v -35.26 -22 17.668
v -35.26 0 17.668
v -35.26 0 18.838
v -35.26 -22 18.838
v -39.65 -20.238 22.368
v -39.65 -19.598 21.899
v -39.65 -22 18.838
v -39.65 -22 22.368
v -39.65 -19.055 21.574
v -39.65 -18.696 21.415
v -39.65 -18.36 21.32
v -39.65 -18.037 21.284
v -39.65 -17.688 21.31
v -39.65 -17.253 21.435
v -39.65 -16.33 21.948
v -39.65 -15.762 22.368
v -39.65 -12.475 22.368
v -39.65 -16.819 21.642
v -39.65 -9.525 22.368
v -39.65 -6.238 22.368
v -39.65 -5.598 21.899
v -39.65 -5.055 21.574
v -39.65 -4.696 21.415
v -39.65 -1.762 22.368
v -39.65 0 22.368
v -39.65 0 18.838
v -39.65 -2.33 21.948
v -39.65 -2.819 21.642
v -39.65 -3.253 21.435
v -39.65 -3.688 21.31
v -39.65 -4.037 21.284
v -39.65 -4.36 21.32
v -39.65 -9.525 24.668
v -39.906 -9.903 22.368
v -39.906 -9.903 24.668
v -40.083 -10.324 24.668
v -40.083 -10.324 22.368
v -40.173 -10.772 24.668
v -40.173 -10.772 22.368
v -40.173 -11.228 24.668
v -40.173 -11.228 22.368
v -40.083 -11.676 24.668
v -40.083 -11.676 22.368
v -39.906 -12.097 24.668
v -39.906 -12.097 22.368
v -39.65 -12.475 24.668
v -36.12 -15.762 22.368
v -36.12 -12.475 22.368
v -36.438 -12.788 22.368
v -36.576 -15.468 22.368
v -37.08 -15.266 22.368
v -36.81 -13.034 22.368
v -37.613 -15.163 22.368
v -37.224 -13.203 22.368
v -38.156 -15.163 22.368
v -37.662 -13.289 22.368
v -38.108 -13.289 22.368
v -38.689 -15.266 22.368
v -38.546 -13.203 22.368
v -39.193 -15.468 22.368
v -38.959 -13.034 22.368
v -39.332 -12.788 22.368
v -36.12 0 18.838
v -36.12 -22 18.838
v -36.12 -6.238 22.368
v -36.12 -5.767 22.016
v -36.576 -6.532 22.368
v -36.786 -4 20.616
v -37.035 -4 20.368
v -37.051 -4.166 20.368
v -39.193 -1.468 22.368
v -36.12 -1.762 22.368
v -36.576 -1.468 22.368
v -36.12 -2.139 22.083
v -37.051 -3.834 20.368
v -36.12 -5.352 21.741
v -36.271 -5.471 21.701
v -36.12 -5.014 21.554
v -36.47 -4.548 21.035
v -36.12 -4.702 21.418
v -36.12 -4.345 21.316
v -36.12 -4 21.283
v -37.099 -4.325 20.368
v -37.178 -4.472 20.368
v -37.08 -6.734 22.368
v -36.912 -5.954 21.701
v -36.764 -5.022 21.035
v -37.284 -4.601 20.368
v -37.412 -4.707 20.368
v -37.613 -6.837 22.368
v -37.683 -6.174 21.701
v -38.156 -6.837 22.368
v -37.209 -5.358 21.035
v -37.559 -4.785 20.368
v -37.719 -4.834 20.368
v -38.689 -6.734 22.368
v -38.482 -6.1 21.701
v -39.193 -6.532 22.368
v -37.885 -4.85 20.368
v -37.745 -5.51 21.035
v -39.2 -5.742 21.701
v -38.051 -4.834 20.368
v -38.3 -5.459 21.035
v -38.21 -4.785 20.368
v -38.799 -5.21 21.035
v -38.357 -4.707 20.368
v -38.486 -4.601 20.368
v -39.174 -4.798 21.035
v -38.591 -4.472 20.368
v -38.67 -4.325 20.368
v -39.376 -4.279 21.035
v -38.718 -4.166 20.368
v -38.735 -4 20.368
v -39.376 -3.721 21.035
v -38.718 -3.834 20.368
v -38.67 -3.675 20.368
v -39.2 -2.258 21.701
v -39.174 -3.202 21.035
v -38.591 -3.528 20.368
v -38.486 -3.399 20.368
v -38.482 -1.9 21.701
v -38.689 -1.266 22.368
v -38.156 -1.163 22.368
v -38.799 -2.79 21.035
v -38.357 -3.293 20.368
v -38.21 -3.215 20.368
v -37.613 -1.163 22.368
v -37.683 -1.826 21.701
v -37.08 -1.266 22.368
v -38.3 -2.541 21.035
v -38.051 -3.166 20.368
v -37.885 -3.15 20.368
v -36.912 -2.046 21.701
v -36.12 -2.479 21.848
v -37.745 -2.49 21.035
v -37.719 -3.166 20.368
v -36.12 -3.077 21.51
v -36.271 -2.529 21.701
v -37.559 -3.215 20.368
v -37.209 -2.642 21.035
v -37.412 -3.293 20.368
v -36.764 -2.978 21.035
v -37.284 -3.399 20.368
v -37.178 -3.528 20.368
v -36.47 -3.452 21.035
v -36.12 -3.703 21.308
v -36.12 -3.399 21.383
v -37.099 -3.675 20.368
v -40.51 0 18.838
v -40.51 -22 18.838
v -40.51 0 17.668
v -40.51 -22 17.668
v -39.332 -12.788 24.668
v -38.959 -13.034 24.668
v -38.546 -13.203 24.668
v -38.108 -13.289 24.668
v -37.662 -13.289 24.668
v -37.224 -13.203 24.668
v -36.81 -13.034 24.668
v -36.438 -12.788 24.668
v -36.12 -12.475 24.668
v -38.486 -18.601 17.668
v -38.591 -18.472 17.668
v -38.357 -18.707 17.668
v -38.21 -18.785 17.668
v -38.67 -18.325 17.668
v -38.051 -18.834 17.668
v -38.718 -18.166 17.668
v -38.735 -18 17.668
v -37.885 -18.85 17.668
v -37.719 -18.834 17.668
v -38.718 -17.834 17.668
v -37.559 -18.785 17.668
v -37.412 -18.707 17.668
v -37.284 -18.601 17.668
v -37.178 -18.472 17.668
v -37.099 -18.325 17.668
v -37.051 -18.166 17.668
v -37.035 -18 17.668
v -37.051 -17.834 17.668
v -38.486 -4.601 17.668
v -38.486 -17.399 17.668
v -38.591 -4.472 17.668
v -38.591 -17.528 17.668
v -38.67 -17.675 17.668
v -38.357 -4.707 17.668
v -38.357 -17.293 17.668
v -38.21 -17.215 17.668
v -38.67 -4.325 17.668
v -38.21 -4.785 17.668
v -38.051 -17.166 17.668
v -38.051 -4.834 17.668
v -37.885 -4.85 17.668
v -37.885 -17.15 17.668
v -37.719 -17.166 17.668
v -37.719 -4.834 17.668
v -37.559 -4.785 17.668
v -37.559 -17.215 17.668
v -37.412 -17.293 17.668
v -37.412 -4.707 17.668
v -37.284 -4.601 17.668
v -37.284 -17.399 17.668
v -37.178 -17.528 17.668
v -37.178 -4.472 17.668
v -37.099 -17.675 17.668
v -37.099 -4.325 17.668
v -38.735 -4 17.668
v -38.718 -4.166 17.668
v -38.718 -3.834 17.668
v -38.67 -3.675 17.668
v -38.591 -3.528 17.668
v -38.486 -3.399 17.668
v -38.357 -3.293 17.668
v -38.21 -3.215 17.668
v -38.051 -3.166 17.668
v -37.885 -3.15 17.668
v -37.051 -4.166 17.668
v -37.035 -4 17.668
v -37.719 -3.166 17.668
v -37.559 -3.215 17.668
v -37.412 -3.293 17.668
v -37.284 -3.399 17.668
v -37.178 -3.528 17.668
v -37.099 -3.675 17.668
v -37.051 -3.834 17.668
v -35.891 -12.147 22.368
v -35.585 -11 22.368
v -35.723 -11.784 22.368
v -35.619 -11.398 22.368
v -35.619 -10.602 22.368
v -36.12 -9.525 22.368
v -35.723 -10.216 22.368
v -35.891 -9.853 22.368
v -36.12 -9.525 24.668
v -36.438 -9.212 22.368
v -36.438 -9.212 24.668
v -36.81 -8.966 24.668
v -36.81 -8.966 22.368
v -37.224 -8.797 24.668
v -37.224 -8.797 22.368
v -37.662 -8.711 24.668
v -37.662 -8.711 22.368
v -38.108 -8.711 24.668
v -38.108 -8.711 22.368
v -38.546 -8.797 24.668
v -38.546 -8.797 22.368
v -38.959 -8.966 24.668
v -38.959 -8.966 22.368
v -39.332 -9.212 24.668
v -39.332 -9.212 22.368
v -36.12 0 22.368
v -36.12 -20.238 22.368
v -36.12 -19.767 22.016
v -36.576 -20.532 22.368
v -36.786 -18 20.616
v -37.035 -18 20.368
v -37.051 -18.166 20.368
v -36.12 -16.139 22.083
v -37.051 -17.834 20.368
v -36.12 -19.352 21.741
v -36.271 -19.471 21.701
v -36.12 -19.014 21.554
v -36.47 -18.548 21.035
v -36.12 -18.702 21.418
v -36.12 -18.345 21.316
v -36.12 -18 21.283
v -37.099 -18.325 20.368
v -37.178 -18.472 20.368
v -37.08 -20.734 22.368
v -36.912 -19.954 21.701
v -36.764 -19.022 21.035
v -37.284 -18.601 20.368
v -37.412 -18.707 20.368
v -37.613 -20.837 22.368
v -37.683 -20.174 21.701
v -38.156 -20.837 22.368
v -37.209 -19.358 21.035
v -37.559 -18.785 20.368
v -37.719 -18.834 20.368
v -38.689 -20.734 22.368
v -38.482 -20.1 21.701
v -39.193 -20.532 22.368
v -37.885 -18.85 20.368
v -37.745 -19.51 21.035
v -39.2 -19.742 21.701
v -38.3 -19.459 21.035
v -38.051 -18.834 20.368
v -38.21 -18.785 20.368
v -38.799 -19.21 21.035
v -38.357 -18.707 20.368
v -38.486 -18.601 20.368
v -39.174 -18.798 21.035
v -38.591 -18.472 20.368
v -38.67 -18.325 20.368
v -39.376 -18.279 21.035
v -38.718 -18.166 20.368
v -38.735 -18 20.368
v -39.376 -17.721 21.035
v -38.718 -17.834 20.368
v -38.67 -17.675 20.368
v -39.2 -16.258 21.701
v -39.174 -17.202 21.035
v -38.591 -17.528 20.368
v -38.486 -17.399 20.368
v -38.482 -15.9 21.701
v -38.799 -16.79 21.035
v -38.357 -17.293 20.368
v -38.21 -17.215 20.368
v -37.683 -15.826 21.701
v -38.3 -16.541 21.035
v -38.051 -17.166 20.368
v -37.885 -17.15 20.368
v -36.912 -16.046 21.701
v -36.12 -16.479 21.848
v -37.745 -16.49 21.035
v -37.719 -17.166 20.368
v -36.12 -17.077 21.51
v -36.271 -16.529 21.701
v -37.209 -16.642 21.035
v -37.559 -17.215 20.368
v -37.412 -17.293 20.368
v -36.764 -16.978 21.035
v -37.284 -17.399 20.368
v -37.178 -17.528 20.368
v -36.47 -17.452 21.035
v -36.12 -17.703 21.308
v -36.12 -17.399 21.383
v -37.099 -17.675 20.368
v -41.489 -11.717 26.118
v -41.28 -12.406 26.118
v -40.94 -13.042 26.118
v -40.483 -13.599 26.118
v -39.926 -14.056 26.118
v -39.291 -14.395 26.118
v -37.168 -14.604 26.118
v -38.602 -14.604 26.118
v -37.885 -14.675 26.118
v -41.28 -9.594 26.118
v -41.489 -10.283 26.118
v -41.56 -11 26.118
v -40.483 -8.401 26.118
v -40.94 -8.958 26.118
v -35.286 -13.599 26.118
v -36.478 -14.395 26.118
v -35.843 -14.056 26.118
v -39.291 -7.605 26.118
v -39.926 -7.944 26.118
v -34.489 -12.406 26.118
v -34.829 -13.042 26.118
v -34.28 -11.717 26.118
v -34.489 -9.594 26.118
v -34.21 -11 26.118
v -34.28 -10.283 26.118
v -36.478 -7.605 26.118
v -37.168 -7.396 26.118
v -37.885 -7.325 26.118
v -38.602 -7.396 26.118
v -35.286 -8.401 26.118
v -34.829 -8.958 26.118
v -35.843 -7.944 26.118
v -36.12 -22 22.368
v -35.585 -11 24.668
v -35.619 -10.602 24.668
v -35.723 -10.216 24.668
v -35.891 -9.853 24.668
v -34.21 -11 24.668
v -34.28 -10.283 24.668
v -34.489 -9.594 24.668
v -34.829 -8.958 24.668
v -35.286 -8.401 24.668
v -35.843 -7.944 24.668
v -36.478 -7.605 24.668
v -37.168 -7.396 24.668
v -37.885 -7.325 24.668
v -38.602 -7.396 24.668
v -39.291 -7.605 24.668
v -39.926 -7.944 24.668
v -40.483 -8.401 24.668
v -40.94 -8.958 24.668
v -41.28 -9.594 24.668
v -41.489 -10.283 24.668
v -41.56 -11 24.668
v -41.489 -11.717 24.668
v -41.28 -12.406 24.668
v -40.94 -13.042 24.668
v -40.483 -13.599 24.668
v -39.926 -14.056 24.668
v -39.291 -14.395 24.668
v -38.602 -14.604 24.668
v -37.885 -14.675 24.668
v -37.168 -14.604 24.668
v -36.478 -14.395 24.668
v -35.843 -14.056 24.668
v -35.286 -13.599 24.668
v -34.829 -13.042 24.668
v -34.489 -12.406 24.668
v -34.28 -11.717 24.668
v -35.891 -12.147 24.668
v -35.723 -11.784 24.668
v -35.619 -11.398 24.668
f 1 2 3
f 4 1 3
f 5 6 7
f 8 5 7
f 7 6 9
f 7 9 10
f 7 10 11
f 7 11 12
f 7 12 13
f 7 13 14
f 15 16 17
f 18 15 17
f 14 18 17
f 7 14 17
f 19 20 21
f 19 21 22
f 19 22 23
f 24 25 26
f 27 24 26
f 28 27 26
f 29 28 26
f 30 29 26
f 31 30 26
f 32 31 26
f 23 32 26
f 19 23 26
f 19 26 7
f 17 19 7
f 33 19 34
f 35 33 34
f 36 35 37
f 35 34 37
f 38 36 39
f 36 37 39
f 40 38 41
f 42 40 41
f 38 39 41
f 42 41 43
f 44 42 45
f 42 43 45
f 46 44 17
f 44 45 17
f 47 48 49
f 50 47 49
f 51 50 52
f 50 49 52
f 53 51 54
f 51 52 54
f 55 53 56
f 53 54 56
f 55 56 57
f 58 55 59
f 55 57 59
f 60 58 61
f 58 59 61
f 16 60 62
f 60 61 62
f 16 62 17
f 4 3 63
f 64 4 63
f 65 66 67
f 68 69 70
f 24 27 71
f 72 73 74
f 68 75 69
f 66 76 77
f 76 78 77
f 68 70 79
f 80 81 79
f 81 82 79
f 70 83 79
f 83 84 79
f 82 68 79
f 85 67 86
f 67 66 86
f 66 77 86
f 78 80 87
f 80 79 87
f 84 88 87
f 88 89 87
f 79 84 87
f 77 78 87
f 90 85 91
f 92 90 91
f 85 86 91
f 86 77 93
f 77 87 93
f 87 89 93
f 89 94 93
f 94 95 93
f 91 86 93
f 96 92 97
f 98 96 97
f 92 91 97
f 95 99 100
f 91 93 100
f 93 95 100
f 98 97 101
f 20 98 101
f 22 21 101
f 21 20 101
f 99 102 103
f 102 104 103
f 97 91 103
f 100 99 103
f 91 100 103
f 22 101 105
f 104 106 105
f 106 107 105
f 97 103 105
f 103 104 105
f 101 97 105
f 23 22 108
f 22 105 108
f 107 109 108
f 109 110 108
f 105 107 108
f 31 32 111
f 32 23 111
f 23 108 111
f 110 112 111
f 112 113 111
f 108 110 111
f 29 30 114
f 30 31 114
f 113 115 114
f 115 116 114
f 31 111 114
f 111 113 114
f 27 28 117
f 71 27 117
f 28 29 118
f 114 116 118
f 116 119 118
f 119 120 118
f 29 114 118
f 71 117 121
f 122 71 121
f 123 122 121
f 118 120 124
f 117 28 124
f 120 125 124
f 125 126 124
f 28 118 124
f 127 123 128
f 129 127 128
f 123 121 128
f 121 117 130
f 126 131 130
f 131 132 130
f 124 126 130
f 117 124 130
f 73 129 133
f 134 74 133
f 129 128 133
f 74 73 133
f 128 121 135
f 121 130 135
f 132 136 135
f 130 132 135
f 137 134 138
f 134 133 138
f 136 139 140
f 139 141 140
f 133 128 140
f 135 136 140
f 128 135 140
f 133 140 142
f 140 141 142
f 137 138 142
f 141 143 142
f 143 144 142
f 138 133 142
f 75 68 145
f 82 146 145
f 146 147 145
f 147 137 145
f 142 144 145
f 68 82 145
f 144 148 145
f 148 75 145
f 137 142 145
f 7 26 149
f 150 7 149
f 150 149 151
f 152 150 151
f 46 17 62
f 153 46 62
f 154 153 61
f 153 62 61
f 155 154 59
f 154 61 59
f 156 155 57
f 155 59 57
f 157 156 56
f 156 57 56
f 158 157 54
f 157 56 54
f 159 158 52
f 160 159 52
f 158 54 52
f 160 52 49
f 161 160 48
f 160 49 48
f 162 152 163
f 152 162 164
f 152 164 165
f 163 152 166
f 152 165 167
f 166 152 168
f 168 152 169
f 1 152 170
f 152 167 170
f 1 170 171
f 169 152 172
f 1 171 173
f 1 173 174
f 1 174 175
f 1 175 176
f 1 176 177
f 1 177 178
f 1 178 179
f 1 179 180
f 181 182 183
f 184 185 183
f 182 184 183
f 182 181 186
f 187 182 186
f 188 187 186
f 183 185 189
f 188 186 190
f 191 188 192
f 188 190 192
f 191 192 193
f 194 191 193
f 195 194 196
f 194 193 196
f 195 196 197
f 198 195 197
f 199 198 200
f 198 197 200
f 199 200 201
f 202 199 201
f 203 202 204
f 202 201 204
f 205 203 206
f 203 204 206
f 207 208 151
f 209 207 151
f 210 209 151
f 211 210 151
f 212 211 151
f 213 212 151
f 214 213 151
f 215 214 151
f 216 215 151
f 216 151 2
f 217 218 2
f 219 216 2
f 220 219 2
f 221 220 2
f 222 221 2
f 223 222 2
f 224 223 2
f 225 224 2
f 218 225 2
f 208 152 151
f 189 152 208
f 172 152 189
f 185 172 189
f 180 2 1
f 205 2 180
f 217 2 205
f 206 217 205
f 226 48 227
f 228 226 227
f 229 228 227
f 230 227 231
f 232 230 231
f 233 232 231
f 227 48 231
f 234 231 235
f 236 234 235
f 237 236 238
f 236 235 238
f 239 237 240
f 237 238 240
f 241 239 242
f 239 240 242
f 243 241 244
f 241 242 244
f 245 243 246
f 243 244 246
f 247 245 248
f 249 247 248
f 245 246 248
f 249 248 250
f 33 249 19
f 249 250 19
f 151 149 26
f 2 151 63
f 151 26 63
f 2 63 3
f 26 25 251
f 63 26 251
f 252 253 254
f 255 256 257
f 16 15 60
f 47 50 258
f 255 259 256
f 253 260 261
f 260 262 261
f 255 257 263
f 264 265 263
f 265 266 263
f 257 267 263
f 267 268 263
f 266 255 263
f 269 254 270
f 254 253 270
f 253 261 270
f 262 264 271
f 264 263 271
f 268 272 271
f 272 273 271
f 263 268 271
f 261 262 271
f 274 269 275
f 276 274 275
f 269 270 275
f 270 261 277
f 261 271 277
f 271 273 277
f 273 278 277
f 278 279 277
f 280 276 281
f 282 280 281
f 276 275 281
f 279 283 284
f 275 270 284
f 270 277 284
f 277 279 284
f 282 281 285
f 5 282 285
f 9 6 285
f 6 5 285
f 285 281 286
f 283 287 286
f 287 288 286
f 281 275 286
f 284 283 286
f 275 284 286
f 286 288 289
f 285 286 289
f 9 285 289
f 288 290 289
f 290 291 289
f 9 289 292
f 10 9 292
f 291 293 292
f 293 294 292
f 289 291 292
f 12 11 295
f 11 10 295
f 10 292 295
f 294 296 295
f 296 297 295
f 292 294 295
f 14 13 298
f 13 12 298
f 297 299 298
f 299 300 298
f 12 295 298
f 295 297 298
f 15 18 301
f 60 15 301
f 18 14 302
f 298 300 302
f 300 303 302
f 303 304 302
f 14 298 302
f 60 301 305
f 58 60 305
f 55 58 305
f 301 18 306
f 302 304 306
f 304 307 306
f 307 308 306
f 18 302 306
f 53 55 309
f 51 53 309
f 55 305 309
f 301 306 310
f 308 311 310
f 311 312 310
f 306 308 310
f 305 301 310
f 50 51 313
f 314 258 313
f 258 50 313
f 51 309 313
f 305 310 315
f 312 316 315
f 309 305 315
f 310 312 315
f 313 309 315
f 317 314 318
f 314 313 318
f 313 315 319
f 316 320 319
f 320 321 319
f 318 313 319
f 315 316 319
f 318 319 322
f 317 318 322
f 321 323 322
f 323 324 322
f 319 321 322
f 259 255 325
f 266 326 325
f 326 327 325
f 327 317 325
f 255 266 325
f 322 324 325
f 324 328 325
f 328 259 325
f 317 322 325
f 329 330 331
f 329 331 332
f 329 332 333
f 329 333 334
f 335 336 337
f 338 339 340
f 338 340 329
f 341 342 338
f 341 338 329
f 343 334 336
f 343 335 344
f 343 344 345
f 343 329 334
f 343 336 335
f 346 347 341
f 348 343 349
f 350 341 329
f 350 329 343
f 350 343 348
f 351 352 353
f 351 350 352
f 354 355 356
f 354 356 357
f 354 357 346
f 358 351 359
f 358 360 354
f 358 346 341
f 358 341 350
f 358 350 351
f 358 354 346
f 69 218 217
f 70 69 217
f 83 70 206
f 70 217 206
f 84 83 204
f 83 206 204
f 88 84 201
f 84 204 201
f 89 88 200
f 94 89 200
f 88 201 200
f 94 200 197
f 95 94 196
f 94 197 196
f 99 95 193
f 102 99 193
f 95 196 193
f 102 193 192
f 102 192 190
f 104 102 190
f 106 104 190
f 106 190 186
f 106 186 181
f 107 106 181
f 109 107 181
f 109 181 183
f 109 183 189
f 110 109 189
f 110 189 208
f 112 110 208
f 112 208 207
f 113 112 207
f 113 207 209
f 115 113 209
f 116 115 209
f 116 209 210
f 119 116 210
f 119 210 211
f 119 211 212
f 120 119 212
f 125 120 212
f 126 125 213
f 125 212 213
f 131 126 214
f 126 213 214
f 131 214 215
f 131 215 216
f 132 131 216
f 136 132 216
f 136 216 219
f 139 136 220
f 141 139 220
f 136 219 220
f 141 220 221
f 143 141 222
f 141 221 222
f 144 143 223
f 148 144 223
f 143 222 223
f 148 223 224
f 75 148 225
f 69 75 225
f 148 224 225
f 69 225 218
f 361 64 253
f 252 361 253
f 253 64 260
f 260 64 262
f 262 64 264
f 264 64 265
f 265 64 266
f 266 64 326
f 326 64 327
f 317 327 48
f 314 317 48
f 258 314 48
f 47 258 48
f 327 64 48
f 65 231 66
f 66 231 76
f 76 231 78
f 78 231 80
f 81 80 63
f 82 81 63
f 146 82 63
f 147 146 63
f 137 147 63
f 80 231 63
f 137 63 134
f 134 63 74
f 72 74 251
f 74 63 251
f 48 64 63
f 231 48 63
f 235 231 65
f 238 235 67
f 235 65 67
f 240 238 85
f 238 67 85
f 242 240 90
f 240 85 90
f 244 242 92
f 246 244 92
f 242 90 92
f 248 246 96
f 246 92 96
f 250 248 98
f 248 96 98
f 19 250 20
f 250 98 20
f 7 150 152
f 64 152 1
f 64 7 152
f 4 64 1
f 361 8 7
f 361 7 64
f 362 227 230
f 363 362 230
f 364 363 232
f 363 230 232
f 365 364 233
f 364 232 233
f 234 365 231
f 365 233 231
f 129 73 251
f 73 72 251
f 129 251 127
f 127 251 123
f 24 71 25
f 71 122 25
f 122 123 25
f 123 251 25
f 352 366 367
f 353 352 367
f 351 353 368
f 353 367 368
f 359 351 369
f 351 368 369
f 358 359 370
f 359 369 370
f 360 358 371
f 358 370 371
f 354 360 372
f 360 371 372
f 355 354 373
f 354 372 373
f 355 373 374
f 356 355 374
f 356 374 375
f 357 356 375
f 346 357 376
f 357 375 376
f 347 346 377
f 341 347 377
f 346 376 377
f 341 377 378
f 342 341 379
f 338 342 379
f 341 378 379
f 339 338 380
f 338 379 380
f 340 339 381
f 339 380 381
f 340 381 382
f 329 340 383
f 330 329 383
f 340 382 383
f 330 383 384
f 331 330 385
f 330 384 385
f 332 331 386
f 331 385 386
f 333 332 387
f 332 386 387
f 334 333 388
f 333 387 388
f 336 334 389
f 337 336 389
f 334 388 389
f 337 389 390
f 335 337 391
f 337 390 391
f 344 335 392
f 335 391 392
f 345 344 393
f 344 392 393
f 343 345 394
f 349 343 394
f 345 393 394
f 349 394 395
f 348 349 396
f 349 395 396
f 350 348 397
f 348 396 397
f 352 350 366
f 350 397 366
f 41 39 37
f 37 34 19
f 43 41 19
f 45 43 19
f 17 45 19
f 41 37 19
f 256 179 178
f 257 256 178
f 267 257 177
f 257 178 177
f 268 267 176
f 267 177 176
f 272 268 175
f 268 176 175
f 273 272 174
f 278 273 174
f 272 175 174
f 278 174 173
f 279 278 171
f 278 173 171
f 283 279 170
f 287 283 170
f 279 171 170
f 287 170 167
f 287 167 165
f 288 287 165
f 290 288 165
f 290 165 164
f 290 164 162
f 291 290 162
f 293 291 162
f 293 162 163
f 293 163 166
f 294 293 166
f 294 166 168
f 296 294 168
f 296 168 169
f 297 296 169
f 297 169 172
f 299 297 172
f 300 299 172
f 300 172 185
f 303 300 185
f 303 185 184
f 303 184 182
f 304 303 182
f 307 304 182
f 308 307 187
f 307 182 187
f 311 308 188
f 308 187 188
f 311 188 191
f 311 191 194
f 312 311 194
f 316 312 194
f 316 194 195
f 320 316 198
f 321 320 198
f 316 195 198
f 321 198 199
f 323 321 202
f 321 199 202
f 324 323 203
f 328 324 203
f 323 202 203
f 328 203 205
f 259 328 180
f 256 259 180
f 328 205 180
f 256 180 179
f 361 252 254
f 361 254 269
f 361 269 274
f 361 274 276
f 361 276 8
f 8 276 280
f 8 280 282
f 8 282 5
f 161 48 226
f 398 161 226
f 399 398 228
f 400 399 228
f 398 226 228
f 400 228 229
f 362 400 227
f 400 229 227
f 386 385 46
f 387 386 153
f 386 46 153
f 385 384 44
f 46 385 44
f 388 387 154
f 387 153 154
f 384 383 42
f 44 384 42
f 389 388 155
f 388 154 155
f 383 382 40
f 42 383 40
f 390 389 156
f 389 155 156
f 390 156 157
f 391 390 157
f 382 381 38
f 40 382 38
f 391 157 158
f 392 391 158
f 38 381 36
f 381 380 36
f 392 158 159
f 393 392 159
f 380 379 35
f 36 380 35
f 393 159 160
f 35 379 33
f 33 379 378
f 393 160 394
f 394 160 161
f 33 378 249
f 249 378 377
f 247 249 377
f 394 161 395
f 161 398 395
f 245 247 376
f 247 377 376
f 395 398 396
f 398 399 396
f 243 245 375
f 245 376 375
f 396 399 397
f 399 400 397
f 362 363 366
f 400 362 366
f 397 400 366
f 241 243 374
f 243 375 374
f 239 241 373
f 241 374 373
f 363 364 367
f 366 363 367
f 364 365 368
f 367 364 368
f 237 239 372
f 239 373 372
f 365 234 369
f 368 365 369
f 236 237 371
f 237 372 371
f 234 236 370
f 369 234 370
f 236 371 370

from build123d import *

# Parameters (mm, degrees)
F1_DEPTH = 22
F3_DEPTH = 2.3
F4_R     = 3.675
F4_R_2   = 2.3
F5_DEPTH = 1.45
F6_R     = 0.85
F7_DEPTH = 25


# Not quite as in the source:
# - a fillet or chamfer that OpenCascade refuses, or shapes differently, is made with other operations: its cross-section is extruded or revolved along the edge and cut away or added


with BuildPart() as f1:
    # F0 (on Front) → F1 (new body)
    with BuildSketch(Plane.XZ):
        Polygon((-36.1197131506, 22.3681449045), (-39.6497131506, 22.3681449045), (-39.6497131506, 18.8381449045), (-40.5097131506, 18.8381449045), (-40.5097131506, 17.6681449045), (-39.6497131506, 17.6681449045), (-36.1197131506, 17.6681449045), (-35.2597131506, 17.6681449045), (-35.2597131506, 18.8381449045), (-36.1197131506, 18.8381449045), align=None)
    extrude(amount=F1_DEPTH)

    # F2 (on face) → F3 (join)
    with BuildSketch(Plane.XY.offset(22.3681449045)):
        with BuildLine():
            Line((-36.1197131506, -12.4747118363), (-36.1197131506, -9.5252881637))
            ThreePointArc((-36.1197131506, -9.5252881637), (-37.8847131506, -8.7), (-39.6497131506, -9.5252881637))
            Line((-39.6497131506, -9.5252881637), (-39.6497131506, -12.4747118363))
            ThreePointArc((-39.6497131506, -12.4747118363), (-37.8847131506, -13.3), (-36.1197131506, -12.4747118363))
        make_face()
        with BuildLine():
            Line((-39.6497131506, -12.4747118363), (-39.6497131506, -9.5252881637))
            ThreePointArc((-39.6497131506, -9.5252881637), (-40.1847131506, -11), (-39.6497131506, -12.4747118363))
        make_face()
        with BuildLine():
            ThreePointArc((-36.1197131506, -12.4747118363), (-35.7225961325, -11.7843787351), (-35.5847131506, -11))
            ThreePointArc((-35.5847131506, -11), (-35.7225961325, -10.2156212649), (-36.1197131506, -9.5252881637))
            Line((-36.1197131506, -9.5252881637), (-36.1197131506, -12.4747118363))
        make_face()
    extrude(amount=F3_DEPTH)

    # F4 (on face) → F5 (join)
    with BuildSketch(Plane.XY.offset(24.6681449045)):
        with Locations((-37.8847131506, -11)):
            Circle(F4_R)
        with Locations((-37.8847131506, -11)):
            Circle(F4_R_2, mode=Mode.SUBTRACT)
        with Locations((-37.8847131506, -11)):
            Circle(F4_R_2)
    extrude(amount=F5_DEPTH)

    # F6 (on face) → F7 (cut)
    with BuildSketch(Plane(origin=(0, 0, 17.6681449045), x_dir=(1, 0, 0), z_dir=(0, 0, -1))):
        with Locations((-37.8847131506, 18)):
            Circle(F6_R)
        with Locations((-37.8847131506, 4)):
            Circle(F6_R)
    extrude(amount=-F7_DEPTH, mode=Mode.SUBTRACT)

    # F8: chamfer of 2 on 1 edges, made by hand

    # F8_s1 → F8_t2 (revolve, cut)
    with BuildSketch(Plane.XZ.offset(18)):
        Polygon((-35.0347131506, 22.3681449045), (-37.0347131506, 20.3681449045), (-37.0347131506, 22.3681449045), align=None)
    revolve(axis=Axis((-37.8847131506, -18, 22.3681449045), (0, 0, -1)), mode=Mode.SUBTRACT)

    # F9: chamfer of 2 on 1 edges, made by hand

    # F9_s1 → F9_t2 (revolve, cut)
    with BuildSketch(Plane.XZ.offset(4)):
        Polygon((-35.0347131506, 22.3681449045), (-37.0347131506, 20.3681449045), (-37.0347131506, 22.3681449045), align=None)
    revolve(axis=Axis((-37.8847131506, -4, 22.3681449045), (0, 0, -1)), mode=Mode.SUBTRACT)


solid = f1.part
